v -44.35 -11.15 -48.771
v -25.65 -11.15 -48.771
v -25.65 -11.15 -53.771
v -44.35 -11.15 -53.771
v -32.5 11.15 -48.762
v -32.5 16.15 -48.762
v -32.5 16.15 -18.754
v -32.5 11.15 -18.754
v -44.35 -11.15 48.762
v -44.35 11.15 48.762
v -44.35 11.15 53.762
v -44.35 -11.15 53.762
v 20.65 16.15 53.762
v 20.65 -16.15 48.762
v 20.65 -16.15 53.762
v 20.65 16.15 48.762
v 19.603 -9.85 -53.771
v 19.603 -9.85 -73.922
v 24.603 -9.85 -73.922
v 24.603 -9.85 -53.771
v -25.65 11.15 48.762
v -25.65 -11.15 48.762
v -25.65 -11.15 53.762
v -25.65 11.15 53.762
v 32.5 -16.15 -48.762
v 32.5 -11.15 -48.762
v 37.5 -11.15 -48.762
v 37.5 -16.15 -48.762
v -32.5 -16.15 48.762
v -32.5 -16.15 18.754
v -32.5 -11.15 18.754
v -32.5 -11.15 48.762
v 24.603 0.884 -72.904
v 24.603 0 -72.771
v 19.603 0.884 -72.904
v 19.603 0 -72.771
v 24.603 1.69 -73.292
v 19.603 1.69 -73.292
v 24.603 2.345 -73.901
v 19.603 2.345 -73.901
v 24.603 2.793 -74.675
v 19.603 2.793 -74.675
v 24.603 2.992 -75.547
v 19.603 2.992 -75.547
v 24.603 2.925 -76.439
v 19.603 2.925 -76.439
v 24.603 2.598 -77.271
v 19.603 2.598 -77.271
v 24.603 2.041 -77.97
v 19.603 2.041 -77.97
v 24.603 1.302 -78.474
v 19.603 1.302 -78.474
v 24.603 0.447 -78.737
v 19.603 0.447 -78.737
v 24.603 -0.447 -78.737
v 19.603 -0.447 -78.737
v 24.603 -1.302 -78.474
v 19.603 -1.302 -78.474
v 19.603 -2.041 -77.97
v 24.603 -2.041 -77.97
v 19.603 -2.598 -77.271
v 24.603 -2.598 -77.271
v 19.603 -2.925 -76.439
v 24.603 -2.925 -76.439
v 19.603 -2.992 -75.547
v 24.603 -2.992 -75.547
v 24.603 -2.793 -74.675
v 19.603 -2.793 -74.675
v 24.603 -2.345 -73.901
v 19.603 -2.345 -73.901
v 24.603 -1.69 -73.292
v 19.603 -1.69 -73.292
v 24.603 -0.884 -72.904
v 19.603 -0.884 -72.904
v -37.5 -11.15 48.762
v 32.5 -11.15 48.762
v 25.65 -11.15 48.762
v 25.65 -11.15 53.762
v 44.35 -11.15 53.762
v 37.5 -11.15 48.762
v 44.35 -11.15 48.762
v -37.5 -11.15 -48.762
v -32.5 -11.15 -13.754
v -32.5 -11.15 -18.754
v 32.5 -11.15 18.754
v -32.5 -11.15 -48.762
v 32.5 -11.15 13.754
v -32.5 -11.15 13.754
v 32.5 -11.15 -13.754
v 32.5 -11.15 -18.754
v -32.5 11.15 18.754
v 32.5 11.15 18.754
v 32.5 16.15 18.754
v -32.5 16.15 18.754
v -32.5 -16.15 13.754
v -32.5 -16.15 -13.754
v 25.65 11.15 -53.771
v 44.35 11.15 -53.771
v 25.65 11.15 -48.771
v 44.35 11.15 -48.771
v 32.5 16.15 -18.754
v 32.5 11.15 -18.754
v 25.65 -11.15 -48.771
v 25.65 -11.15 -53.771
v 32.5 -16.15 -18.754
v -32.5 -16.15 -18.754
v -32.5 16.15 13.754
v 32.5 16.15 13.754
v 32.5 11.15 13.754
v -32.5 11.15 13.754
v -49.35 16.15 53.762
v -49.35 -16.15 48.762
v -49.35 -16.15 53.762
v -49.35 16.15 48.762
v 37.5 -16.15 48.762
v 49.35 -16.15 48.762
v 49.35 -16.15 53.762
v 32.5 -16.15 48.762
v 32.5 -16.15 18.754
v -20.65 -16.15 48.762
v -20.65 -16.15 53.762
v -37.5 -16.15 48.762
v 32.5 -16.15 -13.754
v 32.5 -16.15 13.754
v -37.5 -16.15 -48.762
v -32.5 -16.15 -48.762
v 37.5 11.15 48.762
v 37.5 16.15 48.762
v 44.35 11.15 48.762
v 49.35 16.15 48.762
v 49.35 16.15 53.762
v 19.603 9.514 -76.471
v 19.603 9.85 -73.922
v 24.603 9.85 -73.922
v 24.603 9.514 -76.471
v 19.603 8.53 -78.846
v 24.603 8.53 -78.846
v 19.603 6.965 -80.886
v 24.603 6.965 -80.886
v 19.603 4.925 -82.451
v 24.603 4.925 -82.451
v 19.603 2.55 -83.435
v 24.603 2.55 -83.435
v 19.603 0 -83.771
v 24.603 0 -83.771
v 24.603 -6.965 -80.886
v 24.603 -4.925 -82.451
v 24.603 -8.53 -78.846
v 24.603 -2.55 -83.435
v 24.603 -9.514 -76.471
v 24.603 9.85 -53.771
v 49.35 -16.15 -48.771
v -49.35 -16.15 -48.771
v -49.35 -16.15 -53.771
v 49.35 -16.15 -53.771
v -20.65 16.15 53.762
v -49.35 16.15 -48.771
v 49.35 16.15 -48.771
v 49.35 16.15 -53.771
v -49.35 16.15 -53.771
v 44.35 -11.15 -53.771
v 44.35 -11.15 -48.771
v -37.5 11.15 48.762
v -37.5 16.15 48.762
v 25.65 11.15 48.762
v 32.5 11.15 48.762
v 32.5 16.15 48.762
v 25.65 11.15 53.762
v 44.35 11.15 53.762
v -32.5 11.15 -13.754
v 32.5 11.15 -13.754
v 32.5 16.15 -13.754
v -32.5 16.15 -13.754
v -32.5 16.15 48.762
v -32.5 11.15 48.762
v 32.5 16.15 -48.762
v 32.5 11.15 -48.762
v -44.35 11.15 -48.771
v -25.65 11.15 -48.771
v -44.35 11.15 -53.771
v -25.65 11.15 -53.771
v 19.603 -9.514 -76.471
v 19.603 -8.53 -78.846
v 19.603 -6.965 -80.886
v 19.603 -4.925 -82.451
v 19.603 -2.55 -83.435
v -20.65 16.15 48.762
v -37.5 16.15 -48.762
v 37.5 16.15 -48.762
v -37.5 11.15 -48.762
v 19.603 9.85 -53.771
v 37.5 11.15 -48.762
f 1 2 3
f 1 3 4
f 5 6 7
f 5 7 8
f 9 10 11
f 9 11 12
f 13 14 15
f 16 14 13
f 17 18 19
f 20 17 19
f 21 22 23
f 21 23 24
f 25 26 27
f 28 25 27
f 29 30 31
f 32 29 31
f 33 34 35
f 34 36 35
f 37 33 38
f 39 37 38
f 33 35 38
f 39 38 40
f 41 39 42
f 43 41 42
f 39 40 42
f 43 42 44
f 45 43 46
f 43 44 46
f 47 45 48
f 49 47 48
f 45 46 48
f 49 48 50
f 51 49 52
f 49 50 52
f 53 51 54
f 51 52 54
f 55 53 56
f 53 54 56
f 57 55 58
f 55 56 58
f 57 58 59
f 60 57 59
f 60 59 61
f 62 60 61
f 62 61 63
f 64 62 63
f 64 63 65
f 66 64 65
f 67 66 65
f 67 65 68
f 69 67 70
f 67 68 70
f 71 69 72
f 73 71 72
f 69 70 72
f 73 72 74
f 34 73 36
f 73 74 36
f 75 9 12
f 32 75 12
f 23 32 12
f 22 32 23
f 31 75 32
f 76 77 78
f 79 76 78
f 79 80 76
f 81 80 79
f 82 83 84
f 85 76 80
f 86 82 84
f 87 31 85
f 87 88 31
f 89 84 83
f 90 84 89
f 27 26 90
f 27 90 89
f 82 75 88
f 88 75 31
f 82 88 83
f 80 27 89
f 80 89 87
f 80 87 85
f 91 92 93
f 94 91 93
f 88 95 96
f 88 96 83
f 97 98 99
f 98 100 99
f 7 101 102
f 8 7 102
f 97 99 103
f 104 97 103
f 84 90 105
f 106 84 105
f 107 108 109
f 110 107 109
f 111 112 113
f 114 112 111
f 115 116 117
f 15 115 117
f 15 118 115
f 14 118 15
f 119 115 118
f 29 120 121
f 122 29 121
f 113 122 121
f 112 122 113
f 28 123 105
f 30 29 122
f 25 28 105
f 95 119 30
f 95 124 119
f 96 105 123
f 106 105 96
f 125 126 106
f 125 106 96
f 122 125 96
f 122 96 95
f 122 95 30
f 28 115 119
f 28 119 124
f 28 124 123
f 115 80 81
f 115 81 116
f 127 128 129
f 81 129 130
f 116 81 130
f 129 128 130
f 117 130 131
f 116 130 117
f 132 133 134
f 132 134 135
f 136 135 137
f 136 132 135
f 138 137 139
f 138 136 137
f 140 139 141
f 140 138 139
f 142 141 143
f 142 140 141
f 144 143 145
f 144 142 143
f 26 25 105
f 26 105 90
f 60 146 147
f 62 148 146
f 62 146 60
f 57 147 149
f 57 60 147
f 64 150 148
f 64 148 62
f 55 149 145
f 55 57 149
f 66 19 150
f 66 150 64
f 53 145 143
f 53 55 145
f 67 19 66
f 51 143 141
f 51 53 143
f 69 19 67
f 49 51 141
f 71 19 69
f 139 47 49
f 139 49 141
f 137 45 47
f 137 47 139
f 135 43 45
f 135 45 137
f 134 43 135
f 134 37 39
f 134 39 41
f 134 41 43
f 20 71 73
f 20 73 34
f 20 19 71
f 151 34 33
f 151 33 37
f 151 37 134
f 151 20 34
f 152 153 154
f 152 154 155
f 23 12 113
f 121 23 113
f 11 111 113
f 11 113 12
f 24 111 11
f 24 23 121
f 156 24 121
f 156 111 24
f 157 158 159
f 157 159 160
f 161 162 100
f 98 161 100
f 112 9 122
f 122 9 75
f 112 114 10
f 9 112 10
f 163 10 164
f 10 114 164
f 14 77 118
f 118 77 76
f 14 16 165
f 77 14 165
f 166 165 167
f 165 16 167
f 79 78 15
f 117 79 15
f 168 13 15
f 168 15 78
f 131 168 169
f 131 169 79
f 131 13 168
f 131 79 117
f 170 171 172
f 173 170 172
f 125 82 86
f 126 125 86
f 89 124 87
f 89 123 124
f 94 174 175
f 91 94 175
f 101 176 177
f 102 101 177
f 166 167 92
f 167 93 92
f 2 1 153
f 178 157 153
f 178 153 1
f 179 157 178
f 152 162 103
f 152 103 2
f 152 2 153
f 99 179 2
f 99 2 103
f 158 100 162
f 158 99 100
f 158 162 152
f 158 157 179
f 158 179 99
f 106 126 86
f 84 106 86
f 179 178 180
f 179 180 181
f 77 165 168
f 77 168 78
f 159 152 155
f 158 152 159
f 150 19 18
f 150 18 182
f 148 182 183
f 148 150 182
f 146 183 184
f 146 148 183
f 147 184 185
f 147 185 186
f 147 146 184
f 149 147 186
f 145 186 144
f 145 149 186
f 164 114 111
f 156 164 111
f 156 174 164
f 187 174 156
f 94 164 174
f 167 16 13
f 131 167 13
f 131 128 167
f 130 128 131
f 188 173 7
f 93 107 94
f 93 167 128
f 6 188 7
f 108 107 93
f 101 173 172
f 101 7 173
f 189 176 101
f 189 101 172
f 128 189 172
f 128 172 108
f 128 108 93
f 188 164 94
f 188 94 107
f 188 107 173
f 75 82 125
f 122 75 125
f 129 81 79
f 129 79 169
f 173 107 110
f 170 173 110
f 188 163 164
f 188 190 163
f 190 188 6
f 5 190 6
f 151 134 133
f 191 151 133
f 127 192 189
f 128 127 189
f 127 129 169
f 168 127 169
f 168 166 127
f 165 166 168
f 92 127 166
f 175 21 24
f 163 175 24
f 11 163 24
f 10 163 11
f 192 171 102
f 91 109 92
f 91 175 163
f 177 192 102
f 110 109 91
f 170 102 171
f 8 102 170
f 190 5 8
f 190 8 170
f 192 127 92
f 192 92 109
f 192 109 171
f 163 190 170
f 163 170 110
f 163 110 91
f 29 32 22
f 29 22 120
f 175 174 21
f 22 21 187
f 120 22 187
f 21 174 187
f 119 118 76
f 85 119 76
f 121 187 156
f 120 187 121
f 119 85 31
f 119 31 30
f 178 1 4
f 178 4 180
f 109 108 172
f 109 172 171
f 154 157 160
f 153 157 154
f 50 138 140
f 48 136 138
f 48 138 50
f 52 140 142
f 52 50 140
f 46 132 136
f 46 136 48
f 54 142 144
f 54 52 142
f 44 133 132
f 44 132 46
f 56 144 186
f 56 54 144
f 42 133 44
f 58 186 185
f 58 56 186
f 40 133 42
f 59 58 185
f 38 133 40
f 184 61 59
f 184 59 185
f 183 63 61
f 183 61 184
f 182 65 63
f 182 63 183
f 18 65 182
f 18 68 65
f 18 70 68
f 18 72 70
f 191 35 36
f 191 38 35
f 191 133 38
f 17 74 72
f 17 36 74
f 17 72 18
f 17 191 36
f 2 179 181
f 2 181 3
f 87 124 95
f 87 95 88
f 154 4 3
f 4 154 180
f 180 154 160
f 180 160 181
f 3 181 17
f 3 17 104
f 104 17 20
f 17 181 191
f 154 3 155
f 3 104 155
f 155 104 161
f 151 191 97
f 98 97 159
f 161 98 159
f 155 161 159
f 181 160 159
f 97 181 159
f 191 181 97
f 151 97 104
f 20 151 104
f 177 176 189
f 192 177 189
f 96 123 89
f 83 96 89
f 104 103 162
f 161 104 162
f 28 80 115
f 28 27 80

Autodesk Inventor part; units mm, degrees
ref_plane "YZ Plane" through (0, 0, 0) normal (1, 0, 0) x (0, 1, 0)
sketch "Sketch1" plane through (0, 0, 0) normal (0, 0, 1) x (1, 0, 0)
  line L0 (-32.5, 11.15) -> (32.5, 11.15) construction
  line L1 (32.5, 11.15) -> (32.5, -11.15) construction
  line L2 (32.5, -11.15) -> (-32.5, -11.15) construction
  line L3 (-32.5, -11.15) -> (-32.5, 11.15) construction
  line L4 (-32.5, 11.15) -> (32.5, -11.15) construction
  line L5 (32.5, 11.15) -> (-32.5, -11.15) construction
  line L6 (-32.5, 11.15) -> (-37.5, 11.15)
  line L7 (-37.5, 11.15) -> (-37.5, 16.15)
  line L8 (-37.5, 16.15) -> (-32.5, 16.15)
  line L9 (-32.5, 16.15) -> (-32.5, 11.15)
  line L10 (32.5, 11.15) -> (37.5, 11.15)
  line L11 (37.5, 11.15) -> (37.5, 16.15)
  line L12 (37.5, 16.15) -> (32.5, 16.15)
  line L13 (32.5, 16.15) -> (32.5, 11.15)
  line L14 (32.5, -11.15) -> (37.5, -11.15)
  line L15 (37.5, -11.15) -> (37.5, -16.15)
  line L16 (37.5, -16.15) -> (32.5, -16.15)
  line L17 (32.5, -16.15) -> (32.5, -11.15)
  line L18 (-32.5, -11.15) -> (-37.5, -11.15)
  line L19 (-37.5, -11.15) -> (-37.5, -16.15)
  line L20 (-37.5, -16.15) -> (-32.5, -16.15)
  line L21 (-32.5, -16.15) -> (-32.5, -11.15)
  point P0 (0, 0)
  dimension "d0" = 65
  dimension "d1" = 22.3
  dimension "d2" = 5
  dimension "d3" = 5
  dimension "d4" = 5
  dimension "d5" = 5
  dimension "d6" = 5
  dimension "d7" = 5
  dimension "d8" = 5
  dimension "d9" = 5
extrude "Extrusion1" add sketch "Sketch1" along normal mid plane 97.524
ref_plane "Work Plane1" through (0, 0, 48.762) normal (0, 0, 1) x (1, 0, 0)
sketch "Sketch2" plane through (0, 0, 48.762) normal (0, 0, 1) x (1, 0, 0)
  line L0 (0, 0) -> (-35, 0) construction
  line L1 (0, 0) -> (35, 0) construction
  line L2 (-49.35, 16.15) -> (-20.65, 16.15)
  line L3 (-20.65, 16.15) -> (-20.65, -16.15)
  line L4 (-20.65, -16.15) -> (-49.35, -16.15)
  line L5 (-49.35, -16.15) -> (-49.35, 16.15)
  line L6 (-49.35, 16.15) -> (-20.65, -16.15) construction
  line L7 (-20.65, 16.15) -> (-49.35, -16.15) construction
  line L8 (20.65, 16.15) -> (49.35, 16.15)
  line L9 (49.35, 16.15) -> (49.35, -16.15)
  line L10 (49.35, -16.15) -> (20.65, -16.15)
  line L11 (20.65, -16.15) -> (20.65, 16.15)
  line L12 (20.65, 16.15) -> (49.35, -16.15) construction
  line L13 (49.35, 16.15) -> (20.65, -16.15) construction
  line L14 (-25.65, 11.15) -> (-44.35, 11.15)
  line L15 (-44.35, 11.15) -> (-44.35, -11.15)
  line L16 (-44.35, -11.15) -> (-25.65, -11.15)
  line L17 (-25.65, -11.15) -> (-25.65, 11.15)
  line L18 (44.35, 11.15) -> (25.65, 11.15)
  line L19 (25.65, 11.15) -> (25.65, -11.15)
  line L20 (25.65, -11.15) -> (44.35, -11.15)
  line L21 (44.35, -11.15) -> (44.35, 11.15)
  dimension "d13" = 35
  dimension "d14" = 35
  dimension "d15" = 28.7
  dimension "d16" = 32.3
  dimension "d17" = 28.7
  dimension "d18" = 32.3
  dimension "d19" = 5
  dimension "d20" = 5
extrude "Extrusion2" add sketch "Sketch2" along normal blind 5
ref_plane "Work Plane2" through (0, 0, -48.771) normal (0, 0, 1) x (1, 0, 0)
sketch "Sketch3" plane through (0, 0, -48.771) normal (0, 0, 1) x (1, 0, 0)
  line L0 (49.35, 16.15) -> (-49.35, 16.15)
  line L1 (-49.35, 16.15) -> (-49.35, -16.15)
  line L2 (-49.35, -16.15) -> (49.35, -16.15)
  line L3 (49.35, -16.15) -> (49.35, 16.15)
  line L4 (49.35, 16.15) -> (-49.35, -16.15) construction
  line L5 (-49.35, 16.15) -> (49.35, -16.15) construction
  line L6 (0, 0) -> (35, 0) construction
  line L7 (0, 0) -> (-35, 0) construction
  line L8 (32.5, -11.15) -> (25.65, -11.15) projected
  line L9 (44.35, 11.15) -> (25.65, 11.15)
  line L10 (25.65, 11.15) -> (25.65, -11.15)
  line L11 (25.65, -11.15) -> (44.35, -11.15)
  line L12 (44.35, -11.15) -> (44.35, 11.15)
  line L13 (44.35, 11.15) -> (25.65, -11.15) construction
  line L14 (25.65, 11.15) -> (44.35, -11.15) construction
  line L15 (-44.35, -11.15) -> (-44.35, 11.15) projected
  line L16 (-25.65, -11.15) -> (-44.35, -11.15)
  line L17 (-44.35, -11.15) -> (-44.35, 11.15)
  line L18 (-44.35, 11.15) -> (-25.65, 11.15)
  line L19 (-25.65, 11.15) -> (-25.65, -11.15)
  line L20 (-25.65, -11.15) -> (-44.35, 11.15) construction
  line L21 (-44.35, -11.15) -> (-25.65, 11.15) construction
  point P0 (30, -11.15)
  dimension "d24" = 98.7
  dimension "d25" = 32.3
  dimension "d26" = 35
  dimension "d27" = 35
extrude "Extrusion3" add sketch "Sketch3" against normal blind 5
sketch "Sketch4" plane through (0, 0, 0) normal (1, 0, 0) x (0, 1, 0)
  line L0 (11.15, -48.762) -> (11.15, 48.762) projected
  line L1 (11.15, 18.754) -> (16.15, 18.754)
  line L2 (16.15, 18.754) -> (16.15, 13.754)
  line L3 (16.15, 13.754) -> (11.15, 13.754)
  line L4 (11.15, 13.754) -> (11.15, 18.754)
  line L5 (-16.15, 48.762) -> (16.15, 48.762) projected
  line L6 (11.15, -13.754) -> (16.15, -13.754)
  line L7 (16.15, -13.754) -> (16.15, -18.754)
  line L8 (16.15, -18.754) -> (11.15, -18.754)
  line L9 (11.15, -18.754) -> (11.15, -13.754)
  line L10 (16.15, -48.762) -> (11.15, -48.762) projected
  line L11 (-11.15, 48.762) -> (-11.15, -48.762) projected
  line L12 (-11.15, 18.754) -> (-16.15, 18.754)
  line L13 (-16.15, 18.754) -> (-16.15, 13.754)
  line L14 (-16.15, 13.754) -> (-11.15, 13.754)
  line L15 (-11.15, 13.754) -> (-11.15, 18.754)
  line L16 (-11.15, -18.754) -> (-16.15, -18.754)
  line L17 (-16.15, -18.754) -> (-16.15, -13.754)
  line L18 (-16.15, -13.754) -> (-11.15, -13.754)
  line L19 (-11.15, -13.754) -> (-11.15, -18.754)
  line L20 (-11.15, -48.762) -> (-16.15, -48.762) projected
  point P0 (0, 0)
  dimension "d30" = 5
  dimension "d31" = 5
  dimension "d32" = 30.008
  dimension "d33" = 5
  dimension "d34" = 5
  dimension "d35" = 30.008
  dimension "d36" = 5
  dimension "d37" = 5
  dimension "d38" = 5
  dimension "d39" = 5
  dimension "d40" = 30.008
  dimension "d41" = 30.008
extrude "Extrusion4" add sketch "Sketch4" along normal mid plane 65
sketch "Sketch5" plane through (0, 0, -53.771) normal (0, 0, -1) x (-1, 0, 0)
  line L0 (-24.603, 9.85) -> (-19.603, 9.85)
  line L1 (-19.603, 9.85) -> (-19.603, -9.85)
  line L2 (-19.603, -9.85) -> (-24.603, -9.85)
  line L3 (-24.603, -9.85) -> (-24.603, 9.85)
  line L4 (-24.603, 9.85) -> (-19.603, -9.85) construction
  line L5 (-19.603, 9.85) -> (-24.603, -9.85) construction
  point P0 (0, 0)
  point P1 (-22.103, 0)
  dimension "d44" = 5
  dimension "d45" = 19.7
  dimension "d46" = 24.603
extrude "Extrusion5" add sketch "Sketch5" along normal blind 30
fillet "Fillet1" radius 9.85 2 edges at (22.103, 9.85, -83.771) (22.103, -9.85, -83.771)
sketch "Sketch6" plane through (19.603, -9.85, -53.771) normal (-1, 0, 0) x (0, 0, 1)
  line L0 (0, -1.3) -> (0, 21) construction
  line L1 (0, 9.85) -> (-22, 9.85) construction
  circle A0 centre (-22, 9.85) radius 3
  point P0 (53.771, 9.85)
  dimension "d50" = 22
  dimension "d51" = 6
extrude "Extrusion6" cut sketch "Sketch6" against normal through all
properties part number "MHead"
